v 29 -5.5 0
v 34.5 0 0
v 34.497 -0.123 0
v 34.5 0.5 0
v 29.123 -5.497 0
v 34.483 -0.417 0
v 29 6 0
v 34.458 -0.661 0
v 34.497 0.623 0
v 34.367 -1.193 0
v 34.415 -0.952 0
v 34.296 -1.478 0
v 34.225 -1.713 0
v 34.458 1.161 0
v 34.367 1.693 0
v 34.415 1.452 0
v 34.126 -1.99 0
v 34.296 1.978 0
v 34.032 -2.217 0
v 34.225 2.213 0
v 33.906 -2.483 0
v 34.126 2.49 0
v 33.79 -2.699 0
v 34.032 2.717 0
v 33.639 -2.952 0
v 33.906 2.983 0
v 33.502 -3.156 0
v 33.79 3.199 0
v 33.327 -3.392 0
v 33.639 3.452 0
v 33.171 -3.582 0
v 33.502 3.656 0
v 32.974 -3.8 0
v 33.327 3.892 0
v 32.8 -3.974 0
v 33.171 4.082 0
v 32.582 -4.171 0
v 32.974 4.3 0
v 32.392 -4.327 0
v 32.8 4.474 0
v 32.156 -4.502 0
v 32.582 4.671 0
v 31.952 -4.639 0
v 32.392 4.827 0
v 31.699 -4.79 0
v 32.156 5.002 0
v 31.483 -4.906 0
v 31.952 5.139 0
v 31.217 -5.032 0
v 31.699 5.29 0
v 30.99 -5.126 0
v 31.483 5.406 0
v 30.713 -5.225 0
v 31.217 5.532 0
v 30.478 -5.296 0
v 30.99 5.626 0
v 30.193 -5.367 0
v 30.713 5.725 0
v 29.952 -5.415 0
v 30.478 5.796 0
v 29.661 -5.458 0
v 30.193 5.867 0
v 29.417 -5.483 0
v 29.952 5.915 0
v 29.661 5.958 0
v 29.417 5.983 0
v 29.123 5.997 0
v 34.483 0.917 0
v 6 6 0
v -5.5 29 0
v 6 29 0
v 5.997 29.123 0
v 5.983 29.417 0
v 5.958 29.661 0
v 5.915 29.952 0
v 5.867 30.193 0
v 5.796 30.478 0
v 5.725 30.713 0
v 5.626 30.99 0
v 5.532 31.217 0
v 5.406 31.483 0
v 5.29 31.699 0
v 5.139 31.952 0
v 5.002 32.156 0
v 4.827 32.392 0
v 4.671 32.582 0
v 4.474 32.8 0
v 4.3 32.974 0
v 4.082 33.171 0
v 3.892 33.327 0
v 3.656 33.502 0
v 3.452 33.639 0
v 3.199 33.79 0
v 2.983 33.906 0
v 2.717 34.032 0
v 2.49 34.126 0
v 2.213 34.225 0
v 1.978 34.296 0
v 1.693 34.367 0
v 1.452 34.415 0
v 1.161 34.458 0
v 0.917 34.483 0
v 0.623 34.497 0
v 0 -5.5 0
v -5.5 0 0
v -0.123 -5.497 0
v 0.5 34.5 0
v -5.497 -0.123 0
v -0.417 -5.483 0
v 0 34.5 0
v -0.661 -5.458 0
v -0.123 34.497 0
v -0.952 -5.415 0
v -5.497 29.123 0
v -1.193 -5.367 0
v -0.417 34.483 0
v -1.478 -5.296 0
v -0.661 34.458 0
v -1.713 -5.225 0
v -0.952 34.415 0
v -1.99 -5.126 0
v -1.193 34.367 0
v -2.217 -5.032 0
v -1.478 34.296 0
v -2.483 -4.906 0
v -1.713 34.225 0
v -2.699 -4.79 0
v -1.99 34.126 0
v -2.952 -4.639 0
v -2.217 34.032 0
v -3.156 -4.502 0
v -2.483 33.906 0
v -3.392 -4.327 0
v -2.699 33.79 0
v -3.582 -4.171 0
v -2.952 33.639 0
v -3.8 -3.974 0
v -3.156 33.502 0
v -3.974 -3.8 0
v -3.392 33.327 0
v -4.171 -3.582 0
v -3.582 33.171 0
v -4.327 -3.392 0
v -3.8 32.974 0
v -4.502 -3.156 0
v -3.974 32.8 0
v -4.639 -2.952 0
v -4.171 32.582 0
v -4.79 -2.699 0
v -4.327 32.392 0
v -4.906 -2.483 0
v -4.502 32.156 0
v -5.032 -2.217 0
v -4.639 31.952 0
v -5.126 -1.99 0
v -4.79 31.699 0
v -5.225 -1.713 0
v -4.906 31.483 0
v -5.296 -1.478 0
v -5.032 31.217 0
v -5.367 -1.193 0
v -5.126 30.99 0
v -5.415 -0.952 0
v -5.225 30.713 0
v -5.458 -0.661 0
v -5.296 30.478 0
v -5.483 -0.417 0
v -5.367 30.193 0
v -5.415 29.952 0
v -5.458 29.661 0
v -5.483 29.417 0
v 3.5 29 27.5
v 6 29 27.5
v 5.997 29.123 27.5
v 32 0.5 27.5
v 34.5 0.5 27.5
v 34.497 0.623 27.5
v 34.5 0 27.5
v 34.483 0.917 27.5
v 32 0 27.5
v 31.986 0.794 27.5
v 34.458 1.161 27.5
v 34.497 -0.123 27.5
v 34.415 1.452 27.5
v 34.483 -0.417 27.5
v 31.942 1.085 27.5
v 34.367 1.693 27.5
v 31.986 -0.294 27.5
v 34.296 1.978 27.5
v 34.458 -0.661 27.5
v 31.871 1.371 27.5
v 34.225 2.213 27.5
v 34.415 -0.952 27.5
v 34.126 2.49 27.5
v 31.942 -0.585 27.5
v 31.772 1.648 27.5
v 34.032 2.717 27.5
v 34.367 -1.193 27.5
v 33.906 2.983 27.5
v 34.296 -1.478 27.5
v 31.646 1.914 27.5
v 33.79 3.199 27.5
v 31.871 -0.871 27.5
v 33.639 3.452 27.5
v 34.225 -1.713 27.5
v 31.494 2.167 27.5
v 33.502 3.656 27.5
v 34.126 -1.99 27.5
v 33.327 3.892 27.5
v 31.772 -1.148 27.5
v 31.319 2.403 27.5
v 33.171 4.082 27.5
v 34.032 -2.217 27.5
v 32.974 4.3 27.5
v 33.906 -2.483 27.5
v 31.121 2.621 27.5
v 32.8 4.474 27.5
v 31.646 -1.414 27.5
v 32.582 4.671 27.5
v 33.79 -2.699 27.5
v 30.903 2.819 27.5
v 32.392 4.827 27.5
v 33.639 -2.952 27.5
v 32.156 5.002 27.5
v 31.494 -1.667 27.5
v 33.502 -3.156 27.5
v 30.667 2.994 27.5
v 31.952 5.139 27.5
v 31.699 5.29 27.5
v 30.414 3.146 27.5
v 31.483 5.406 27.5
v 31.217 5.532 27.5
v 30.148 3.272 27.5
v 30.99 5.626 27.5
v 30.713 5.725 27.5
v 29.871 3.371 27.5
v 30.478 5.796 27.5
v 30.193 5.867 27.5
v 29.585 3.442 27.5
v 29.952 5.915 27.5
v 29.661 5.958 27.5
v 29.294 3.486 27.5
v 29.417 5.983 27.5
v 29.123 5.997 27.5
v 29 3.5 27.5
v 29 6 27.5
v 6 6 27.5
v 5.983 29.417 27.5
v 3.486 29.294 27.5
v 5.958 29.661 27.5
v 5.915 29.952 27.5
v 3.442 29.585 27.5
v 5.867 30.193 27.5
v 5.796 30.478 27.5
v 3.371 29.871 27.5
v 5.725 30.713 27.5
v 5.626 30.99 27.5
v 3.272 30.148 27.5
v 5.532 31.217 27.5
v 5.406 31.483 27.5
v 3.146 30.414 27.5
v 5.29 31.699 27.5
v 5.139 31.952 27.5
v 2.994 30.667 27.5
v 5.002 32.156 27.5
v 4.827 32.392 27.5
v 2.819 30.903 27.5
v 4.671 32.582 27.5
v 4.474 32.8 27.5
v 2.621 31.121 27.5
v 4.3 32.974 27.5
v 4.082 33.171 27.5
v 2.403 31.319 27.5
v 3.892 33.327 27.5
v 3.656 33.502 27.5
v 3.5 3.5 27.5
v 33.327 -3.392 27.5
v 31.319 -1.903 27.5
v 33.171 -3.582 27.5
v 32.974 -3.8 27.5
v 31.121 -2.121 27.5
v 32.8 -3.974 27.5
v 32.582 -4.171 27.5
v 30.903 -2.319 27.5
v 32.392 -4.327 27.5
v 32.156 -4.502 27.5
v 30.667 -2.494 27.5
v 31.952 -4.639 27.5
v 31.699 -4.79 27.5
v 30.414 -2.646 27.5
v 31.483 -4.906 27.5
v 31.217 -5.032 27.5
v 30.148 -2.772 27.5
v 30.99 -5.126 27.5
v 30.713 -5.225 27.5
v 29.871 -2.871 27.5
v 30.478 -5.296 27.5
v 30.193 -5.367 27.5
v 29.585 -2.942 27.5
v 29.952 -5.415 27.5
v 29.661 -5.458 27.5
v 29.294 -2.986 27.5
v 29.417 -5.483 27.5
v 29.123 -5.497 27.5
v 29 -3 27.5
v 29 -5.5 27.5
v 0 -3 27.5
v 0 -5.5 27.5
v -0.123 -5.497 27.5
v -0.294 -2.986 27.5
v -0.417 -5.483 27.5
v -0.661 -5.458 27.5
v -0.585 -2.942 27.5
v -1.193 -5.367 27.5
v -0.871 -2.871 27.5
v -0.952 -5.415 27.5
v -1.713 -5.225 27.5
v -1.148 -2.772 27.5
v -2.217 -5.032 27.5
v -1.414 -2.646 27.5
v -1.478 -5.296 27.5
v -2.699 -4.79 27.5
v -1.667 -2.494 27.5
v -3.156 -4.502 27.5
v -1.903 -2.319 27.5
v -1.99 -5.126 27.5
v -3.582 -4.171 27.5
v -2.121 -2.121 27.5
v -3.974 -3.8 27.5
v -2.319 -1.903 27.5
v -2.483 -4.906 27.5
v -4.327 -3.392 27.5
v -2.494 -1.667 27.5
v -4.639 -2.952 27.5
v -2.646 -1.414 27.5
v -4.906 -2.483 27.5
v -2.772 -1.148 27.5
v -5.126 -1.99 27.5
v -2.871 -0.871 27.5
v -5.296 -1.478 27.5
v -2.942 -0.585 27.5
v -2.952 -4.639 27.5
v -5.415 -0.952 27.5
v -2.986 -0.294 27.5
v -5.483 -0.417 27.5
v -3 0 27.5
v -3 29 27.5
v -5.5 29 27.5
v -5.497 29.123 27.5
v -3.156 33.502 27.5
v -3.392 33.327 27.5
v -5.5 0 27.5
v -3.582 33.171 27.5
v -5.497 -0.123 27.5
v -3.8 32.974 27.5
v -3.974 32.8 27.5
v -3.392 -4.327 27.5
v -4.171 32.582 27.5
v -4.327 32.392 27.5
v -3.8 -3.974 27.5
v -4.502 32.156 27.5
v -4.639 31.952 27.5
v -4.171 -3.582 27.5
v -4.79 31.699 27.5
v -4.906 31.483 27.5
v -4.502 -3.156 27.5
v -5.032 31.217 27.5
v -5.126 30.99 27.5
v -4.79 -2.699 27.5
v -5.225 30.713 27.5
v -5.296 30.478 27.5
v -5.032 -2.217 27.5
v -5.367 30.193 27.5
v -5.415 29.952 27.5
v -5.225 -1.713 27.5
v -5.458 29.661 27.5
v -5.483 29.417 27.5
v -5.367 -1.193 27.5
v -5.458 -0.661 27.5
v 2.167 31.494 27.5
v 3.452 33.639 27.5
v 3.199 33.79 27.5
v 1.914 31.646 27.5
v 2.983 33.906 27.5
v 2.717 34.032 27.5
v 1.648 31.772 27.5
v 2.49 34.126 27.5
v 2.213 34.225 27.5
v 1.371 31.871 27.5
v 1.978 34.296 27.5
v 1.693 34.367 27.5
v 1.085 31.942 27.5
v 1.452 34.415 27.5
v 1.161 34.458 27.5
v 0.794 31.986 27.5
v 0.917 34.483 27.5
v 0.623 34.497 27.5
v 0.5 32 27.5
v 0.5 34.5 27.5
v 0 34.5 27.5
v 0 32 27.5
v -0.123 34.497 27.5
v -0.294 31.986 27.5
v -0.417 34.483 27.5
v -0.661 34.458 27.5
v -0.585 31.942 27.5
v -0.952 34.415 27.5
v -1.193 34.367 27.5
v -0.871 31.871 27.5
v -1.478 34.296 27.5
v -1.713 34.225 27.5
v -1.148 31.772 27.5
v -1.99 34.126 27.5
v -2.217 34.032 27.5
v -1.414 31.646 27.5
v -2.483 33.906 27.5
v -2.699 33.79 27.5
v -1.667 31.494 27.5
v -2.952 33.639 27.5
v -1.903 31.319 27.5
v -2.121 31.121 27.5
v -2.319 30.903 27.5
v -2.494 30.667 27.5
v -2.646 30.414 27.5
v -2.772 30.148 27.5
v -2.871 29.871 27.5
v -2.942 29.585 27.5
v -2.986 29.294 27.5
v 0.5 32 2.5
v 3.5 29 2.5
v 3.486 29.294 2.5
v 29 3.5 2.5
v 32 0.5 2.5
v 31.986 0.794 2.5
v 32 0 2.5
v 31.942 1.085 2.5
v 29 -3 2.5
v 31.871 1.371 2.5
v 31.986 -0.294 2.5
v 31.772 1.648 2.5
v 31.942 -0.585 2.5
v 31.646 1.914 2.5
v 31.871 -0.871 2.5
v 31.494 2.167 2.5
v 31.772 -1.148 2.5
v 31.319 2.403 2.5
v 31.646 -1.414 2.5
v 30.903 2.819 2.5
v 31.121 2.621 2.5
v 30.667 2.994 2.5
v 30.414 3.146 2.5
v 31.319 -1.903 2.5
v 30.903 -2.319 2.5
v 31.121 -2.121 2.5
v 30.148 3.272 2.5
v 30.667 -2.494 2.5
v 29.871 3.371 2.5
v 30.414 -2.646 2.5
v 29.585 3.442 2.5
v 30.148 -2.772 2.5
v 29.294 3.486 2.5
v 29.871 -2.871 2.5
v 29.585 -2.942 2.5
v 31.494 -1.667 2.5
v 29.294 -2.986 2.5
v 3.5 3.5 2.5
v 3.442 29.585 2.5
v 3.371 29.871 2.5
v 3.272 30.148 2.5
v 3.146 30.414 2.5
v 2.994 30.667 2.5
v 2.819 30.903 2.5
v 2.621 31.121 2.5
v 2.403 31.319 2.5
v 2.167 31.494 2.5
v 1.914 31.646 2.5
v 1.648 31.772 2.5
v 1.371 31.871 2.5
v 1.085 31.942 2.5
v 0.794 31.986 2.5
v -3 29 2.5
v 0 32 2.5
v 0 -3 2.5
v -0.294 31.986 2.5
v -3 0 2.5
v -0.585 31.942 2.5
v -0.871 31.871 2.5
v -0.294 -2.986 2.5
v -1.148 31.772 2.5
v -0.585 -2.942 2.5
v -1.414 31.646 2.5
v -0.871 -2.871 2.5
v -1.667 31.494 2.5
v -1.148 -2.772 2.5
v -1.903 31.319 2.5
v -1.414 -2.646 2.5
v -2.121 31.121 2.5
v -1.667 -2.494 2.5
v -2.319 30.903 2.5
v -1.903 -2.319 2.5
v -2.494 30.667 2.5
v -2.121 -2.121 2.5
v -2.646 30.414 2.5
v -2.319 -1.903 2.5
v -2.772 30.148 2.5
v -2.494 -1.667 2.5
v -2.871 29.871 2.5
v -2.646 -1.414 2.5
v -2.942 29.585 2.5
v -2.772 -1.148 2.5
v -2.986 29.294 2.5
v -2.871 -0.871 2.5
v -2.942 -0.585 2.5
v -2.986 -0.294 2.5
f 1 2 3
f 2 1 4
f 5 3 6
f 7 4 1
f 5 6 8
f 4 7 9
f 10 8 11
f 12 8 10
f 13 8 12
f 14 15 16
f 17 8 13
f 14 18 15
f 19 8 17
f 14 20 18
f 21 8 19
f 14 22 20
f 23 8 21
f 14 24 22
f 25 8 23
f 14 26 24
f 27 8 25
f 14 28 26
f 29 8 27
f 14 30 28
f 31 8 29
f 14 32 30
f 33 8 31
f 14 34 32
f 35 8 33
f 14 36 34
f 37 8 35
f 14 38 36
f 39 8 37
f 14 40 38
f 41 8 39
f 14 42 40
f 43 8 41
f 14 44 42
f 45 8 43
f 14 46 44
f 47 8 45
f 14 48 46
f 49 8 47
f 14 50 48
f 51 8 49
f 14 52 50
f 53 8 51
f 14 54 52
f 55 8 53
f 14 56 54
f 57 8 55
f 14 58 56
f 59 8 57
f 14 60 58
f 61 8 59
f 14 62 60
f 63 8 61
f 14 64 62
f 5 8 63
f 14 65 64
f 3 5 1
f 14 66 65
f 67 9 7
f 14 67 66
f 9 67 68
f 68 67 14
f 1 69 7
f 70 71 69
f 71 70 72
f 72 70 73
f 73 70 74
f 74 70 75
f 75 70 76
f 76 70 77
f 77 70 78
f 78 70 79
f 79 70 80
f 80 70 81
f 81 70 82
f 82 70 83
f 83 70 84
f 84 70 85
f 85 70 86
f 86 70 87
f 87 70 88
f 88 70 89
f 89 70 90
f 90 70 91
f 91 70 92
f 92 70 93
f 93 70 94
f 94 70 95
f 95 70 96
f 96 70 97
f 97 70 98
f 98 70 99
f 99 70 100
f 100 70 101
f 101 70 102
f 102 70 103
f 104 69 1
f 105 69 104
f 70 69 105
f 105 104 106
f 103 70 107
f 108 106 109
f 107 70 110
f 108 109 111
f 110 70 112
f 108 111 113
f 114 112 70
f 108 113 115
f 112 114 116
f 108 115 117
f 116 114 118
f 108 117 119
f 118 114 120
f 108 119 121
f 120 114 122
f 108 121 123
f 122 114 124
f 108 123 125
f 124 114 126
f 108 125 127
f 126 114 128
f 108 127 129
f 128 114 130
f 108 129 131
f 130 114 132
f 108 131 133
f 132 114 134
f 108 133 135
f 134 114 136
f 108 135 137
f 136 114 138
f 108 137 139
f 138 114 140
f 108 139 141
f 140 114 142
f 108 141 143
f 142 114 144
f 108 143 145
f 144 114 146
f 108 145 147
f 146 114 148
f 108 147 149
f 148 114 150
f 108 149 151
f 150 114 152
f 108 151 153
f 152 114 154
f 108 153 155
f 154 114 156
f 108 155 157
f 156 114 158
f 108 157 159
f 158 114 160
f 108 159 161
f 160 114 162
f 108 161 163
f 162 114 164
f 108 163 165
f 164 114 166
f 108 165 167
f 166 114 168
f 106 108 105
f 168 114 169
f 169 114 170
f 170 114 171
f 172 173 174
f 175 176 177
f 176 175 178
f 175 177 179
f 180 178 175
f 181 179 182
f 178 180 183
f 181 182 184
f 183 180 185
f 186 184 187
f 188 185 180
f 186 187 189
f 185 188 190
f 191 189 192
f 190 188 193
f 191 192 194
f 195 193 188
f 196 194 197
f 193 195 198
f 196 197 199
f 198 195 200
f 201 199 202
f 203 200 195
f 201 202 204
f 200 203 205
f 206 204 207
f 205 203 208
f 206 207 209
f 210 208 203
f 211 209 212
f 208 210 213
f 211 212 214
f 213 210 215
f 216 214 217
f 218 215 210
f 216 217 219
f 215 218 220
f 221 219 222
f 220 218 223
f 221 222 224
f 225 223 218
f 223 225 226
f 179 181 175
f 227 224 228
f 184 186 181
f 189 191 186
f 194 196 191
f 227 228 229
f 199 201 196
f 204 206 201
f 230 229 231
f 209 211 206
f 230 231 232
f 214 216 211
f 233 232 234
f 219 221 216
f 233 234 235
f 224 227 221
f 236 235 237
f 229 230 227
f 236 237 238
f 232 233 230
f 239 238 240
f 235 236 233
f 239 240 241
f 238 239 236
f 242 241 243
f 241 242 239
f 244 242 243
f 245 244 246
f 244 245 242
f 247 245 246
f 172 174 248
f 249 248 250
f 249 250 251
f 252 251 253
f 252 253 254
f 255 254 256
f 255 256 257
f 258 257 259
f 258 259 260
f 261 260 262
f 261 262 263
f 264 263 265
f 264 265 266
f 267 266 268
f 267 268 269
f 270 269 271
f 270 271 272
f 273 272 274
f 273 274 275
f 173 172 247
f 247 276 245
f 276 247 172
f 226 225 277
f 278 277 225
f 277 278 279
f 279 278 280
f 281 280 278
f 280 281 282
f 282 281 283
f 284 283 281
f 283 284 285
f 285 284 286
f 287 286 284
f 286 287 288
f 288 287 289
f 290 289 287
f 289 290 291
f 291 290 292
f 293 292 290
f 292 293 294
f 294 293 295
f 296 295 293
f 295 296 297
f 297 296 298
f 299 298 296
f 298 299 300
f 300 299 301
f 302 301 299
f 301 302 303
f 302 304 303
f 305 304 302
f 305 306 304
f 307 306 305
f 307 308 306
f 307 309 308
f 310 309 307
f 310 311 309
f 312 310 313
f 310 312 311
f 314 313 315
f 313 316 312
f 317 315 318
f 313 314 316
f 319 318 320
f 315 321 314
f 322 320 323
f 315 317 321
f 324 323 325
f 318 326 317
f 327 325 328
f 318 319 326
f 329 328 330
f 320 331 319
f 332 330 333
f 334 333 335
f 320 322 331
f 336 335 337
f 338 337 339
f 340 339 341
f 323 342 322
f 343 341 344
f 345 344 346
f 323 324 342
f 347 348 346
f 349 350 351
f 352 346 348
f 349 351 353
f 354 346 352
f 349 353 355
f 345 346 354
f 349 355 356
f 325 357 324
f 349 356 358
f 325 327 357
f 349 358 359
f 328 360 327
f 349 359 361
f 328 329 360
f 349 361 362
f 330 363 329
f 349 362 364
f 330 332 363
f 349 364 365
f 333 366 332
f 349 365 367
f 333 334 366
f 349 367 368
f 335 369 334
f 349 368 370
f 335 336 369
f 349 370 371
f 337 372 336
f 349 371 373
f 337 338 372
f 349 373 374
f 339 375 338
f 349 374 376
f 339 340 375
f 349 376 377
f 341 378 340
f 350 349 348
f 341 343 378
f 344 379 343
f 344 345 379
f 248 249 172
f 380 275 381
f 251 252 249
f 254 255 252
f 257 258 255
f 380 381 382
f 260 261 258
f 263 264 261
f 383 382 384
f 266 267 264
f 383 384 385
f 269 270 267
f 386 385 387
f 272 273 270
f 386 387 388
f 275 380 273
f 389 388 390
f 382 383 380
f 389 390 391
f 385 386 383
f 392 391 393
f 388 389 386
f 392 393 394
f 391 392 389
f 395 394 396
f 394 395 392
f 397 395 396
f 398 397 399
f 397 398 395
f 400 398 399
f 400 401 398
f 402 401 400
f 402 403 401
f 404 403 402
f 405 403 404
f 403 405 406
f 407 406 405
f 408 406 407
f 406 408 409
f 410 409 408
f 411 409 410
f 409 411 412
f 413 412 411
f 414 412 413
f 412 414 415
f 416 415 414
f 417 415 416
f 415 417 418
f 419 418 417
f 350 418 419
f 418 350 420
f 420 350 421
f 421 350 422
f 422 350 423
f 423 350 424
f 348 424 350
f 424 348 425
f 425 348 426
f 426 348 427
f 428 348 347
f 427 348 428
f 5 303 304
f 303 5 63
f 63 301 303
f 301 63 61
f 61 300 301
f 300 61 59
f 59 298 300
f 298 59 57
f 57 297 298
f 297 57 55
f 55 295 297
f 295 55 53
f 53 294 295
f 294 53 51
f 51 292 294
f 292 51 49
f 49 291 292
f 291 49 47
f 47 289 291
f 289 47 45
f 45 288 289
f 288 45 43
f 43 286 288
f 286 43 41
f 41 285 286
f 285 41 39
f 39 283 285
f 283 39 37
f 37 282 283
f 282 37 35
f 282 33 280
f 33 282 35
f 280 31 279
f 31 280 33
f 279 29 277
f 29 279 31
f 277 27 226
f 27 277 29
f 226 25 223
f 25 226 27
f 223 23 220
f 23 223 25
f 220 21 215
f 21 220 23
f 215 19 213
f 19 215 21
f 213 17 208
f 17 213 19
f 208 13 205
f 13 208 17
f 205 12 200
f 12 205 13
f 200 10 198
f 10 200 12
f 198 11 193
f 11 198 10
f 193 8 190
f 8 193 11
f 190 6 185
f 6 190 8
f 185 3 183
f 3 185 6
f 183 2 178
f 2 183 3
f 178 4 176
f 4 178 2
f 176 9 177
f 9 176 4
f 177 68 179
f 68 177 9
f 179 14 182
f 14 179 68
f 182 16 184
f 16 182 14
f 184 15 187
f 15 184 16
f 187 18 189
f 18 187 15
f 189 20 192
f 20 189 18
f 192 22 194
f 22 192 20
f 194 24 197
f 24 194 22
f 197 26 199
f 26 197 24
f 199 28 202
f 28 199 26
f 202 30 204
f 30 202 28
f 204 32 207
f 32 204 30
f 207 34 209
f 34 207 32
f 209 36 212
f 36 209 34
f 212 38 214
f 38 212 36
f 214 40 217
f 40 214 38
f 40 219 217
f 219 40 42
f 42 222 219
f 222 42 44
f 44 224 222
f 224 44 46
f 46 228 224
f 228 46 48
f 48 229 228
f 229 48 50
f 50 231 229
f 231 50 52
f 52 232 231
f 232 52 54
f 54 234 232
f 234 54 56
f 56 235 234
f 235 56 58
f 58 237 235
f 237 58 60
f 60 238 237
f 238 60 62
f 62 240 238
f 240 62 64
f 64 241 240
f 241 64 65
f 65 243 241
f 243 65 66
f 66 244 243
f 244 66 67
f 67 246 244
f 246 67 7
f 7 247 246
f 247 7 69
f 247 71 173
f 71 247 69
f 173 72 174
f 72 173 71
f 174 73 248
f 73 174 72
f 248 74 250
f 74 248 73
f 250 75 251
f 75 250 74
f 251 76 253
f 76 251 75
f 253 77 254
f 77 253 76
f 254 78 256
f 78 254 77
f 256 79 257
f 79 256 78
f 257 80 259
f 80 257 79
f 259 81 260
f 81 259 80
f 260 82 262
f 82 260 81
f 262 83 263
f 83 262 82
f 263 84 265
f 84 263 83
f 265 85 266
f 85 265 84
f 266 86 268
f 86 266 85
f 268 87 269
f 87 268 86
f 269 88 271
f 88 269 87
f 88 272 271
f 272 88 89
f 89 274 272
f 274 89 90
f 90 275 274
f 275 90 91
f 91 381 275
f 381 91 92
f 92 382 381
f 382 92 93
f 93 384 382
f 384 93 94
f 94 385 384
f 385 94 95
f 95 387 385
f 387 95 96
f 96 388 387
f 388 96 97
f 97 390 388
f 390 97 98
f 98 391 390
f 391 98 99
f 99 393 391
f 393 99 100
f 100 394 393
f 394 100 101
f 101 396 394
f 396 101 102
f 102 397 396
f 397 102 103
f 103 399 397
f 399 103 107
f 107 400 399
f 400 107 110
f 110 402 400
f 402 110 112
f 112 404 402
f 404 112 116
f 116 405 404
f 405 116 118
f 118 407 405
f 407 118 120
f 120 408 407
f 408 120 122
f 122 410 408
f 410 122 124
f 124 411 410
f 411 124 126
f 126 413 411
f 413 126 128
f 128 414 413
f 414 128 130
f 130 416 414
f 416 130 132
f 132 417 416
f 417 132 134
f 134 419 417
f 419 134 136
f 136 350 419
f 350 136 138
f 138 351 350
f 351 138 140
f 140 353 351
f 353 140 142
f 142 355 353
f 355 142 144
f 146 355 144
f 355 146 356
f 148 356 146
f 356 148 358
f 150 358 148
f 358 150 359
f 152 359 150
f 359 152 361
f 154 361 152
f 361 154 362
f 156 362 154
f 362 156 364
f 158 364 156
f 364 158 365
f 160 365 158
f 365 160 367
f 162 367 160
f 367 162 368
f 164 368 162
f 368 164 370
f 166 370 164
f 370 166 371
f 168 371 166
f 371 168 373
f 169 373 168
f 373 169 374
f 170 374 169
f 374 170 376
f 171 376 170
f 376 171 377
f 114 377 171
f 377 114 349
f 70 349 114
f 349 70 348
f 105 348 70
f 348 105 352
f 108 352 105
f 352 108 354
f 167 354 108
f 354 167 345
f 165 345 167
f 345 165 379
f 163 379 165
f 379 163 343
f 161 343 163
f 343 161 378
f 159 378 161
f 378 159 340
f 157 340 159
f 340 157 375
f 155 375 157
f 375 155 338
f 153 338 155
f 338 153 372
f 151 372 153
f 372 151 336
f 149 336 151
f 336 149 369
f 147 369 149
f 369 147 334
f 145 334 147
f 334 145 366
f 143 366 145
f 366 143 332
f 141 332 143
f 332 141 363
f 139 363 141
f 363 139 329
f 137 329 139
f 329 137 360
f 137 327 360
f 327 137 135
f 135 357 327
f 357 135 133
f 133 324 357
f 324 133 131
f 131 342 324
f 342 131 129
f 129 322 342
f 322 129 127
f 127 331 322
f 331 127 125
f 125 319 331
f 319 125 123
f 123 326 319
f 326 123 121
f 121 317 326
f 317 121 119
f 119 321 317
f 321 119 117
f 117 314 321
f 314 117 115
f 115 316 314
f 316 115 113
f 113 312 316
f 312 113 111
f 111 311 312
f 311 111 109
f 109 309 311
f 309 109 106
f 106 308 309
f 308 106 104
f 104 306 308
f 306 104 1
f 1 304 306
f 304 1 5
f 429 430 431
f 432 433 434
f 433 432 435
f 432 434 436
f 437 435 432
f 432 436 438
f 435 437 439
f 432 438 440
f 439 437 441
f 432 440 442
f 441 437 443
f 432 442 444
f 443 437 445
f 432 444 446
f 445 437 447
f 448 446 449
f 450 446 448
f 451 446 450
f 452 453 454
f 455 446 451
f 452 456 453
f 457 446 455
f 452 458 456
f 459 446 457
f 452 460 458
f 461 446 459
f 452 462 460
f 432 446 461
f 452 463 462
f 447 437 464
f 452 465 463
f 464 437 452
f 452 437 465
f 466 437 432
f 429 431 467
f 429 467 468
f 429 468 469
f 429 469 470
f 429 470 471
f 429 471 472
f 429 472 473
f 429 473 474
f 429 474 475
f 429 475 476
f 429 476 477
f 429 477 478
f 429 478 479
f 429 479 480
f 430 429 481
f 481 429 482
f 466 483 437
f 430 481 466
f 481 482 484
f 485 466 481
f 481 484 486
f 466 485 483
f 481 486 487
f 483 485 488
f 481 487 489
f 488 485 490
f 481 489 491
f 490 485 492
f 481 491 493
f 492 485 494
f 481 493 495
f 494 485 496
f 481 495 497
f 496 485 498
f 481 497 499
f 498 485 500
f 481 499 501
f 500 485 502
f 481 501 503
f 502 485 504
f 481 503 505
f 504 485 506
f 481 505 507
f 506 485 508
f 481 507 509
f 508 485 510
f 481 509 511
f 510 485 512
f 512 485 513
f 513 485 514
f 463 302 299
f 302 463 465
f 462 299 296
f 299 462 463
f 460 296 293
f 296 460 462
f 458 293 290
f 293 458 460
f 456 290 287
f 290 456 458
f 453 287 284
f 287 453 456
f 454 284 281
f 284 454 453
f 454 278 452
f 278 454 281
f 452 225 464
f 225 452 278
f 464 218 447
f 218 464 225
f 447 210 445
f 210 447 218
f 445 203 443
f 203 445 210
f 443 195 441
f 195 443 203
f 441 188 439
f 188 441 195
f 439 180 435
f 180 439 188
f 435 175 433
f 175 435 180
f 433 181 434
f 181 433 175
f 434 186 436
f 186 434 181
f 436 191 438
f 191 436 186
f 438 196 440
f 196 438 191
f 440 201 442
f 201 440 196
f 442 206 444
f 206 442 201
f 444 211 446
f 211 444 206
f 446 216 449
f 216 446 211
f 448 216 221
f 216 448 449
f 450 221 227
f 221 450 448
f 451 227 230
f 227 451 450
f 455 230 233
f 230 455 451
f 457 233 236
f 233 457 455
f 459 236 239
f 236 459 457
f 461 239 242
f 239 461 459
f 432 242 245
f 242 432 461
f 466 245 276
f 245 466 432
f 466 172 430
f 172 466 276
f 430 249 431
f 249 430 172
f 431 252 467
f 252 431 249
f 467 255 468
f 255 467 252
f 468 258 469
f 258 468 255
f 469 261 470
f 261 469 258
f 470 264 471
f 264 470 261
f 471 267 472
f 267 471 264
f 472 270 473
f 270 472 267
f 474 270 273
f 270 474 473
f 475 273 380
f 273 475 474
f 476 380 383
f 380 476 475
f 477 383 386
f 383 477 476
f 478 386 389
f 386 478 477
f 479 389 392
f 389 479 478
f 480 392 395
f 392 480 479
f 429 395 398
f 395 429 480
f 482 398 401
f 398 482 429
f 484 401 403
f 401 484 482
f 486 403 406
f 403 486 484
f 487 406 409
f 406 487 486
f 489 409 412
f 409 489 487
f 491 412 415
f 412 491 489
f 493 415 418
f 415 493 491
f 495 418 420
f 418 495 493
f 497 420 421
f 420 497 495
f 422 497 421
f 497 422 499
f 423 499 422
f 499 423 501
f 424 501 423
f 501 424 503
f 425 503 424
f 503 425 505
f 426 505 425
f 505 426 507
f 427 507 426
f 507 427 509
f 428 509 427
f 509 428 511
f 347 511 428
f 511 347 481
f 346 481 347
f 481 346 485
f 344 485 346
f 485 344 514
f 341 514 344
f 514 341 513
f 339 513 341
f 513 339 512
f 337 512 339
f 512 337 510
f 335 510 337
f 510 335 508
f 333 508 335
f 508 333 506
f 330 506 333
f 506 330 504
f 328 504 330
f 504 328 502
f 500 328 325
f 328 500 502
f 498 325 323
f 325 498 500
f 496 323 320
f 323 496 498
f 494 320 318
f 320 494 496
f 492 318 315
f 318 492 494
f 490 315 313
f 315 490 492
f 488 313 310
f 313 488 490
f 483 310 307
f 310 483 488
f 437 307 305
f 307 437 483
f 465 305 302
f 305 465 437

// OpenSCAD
// Bike Stand Grip Cover
// Parametric design for an L-shaped grip cover sleeve

// --- Parameters ---
BAR_L = 35;            // Total length of each leg of the L (measured from outside) (mm)
BAR_T = 6.5;           // Total thickness of the bike stand's L-profile (mm)
EXTRUSION_DEPTH = 25;  // Depth of the part being covered (mm)
WALL = 2.5;            // Thickness of the grip cover walls (mm)
ROUNDING = 3;          // Rounding radius for the L-shape corners (mm)
$fn = 64;              // Smoothness

// --- Modules ---

module base_l_shape(l, t) {
    // Basic L-shape composed of two rectangles
    union() {
        square([l, t]);
        square([t, l]);
    }
}

module rounded_l_profile() {
    // To get a final size of BAR_L and thickness BAR_T with rounding,
    // we start with a smaller shape and expand it using offset.
    // This ensures the final bounding box is exactly BAR_L x BAR_L.
    offset(r = ROUNDING) 
        base_l_shape(BAR_L - 2 * ROUNDING, BAR_T - 2 * ROUNDING);
}

module grip_cover() {
    total_depth = EXTRUSION_DEPTH + WALL;
    
    difference() {
        // Outer Shell
        linear_extrude(height = total_depth) {
            // The outer shell is an offset of the inner rounded profile
            offset(r = WALL) 
                rounded_l_profile();
        }
        
        // Inner Void
        // Shifted by WALL in Z to leave a bottom cap.
        translate([0, 0, WALL]) {
            linear_extrude(height = EXTRUSION_DEPTH + 0.1) {
                rounded_l_profile();
            }
        }
    }
}

// --- Render ---
grip_cover();
